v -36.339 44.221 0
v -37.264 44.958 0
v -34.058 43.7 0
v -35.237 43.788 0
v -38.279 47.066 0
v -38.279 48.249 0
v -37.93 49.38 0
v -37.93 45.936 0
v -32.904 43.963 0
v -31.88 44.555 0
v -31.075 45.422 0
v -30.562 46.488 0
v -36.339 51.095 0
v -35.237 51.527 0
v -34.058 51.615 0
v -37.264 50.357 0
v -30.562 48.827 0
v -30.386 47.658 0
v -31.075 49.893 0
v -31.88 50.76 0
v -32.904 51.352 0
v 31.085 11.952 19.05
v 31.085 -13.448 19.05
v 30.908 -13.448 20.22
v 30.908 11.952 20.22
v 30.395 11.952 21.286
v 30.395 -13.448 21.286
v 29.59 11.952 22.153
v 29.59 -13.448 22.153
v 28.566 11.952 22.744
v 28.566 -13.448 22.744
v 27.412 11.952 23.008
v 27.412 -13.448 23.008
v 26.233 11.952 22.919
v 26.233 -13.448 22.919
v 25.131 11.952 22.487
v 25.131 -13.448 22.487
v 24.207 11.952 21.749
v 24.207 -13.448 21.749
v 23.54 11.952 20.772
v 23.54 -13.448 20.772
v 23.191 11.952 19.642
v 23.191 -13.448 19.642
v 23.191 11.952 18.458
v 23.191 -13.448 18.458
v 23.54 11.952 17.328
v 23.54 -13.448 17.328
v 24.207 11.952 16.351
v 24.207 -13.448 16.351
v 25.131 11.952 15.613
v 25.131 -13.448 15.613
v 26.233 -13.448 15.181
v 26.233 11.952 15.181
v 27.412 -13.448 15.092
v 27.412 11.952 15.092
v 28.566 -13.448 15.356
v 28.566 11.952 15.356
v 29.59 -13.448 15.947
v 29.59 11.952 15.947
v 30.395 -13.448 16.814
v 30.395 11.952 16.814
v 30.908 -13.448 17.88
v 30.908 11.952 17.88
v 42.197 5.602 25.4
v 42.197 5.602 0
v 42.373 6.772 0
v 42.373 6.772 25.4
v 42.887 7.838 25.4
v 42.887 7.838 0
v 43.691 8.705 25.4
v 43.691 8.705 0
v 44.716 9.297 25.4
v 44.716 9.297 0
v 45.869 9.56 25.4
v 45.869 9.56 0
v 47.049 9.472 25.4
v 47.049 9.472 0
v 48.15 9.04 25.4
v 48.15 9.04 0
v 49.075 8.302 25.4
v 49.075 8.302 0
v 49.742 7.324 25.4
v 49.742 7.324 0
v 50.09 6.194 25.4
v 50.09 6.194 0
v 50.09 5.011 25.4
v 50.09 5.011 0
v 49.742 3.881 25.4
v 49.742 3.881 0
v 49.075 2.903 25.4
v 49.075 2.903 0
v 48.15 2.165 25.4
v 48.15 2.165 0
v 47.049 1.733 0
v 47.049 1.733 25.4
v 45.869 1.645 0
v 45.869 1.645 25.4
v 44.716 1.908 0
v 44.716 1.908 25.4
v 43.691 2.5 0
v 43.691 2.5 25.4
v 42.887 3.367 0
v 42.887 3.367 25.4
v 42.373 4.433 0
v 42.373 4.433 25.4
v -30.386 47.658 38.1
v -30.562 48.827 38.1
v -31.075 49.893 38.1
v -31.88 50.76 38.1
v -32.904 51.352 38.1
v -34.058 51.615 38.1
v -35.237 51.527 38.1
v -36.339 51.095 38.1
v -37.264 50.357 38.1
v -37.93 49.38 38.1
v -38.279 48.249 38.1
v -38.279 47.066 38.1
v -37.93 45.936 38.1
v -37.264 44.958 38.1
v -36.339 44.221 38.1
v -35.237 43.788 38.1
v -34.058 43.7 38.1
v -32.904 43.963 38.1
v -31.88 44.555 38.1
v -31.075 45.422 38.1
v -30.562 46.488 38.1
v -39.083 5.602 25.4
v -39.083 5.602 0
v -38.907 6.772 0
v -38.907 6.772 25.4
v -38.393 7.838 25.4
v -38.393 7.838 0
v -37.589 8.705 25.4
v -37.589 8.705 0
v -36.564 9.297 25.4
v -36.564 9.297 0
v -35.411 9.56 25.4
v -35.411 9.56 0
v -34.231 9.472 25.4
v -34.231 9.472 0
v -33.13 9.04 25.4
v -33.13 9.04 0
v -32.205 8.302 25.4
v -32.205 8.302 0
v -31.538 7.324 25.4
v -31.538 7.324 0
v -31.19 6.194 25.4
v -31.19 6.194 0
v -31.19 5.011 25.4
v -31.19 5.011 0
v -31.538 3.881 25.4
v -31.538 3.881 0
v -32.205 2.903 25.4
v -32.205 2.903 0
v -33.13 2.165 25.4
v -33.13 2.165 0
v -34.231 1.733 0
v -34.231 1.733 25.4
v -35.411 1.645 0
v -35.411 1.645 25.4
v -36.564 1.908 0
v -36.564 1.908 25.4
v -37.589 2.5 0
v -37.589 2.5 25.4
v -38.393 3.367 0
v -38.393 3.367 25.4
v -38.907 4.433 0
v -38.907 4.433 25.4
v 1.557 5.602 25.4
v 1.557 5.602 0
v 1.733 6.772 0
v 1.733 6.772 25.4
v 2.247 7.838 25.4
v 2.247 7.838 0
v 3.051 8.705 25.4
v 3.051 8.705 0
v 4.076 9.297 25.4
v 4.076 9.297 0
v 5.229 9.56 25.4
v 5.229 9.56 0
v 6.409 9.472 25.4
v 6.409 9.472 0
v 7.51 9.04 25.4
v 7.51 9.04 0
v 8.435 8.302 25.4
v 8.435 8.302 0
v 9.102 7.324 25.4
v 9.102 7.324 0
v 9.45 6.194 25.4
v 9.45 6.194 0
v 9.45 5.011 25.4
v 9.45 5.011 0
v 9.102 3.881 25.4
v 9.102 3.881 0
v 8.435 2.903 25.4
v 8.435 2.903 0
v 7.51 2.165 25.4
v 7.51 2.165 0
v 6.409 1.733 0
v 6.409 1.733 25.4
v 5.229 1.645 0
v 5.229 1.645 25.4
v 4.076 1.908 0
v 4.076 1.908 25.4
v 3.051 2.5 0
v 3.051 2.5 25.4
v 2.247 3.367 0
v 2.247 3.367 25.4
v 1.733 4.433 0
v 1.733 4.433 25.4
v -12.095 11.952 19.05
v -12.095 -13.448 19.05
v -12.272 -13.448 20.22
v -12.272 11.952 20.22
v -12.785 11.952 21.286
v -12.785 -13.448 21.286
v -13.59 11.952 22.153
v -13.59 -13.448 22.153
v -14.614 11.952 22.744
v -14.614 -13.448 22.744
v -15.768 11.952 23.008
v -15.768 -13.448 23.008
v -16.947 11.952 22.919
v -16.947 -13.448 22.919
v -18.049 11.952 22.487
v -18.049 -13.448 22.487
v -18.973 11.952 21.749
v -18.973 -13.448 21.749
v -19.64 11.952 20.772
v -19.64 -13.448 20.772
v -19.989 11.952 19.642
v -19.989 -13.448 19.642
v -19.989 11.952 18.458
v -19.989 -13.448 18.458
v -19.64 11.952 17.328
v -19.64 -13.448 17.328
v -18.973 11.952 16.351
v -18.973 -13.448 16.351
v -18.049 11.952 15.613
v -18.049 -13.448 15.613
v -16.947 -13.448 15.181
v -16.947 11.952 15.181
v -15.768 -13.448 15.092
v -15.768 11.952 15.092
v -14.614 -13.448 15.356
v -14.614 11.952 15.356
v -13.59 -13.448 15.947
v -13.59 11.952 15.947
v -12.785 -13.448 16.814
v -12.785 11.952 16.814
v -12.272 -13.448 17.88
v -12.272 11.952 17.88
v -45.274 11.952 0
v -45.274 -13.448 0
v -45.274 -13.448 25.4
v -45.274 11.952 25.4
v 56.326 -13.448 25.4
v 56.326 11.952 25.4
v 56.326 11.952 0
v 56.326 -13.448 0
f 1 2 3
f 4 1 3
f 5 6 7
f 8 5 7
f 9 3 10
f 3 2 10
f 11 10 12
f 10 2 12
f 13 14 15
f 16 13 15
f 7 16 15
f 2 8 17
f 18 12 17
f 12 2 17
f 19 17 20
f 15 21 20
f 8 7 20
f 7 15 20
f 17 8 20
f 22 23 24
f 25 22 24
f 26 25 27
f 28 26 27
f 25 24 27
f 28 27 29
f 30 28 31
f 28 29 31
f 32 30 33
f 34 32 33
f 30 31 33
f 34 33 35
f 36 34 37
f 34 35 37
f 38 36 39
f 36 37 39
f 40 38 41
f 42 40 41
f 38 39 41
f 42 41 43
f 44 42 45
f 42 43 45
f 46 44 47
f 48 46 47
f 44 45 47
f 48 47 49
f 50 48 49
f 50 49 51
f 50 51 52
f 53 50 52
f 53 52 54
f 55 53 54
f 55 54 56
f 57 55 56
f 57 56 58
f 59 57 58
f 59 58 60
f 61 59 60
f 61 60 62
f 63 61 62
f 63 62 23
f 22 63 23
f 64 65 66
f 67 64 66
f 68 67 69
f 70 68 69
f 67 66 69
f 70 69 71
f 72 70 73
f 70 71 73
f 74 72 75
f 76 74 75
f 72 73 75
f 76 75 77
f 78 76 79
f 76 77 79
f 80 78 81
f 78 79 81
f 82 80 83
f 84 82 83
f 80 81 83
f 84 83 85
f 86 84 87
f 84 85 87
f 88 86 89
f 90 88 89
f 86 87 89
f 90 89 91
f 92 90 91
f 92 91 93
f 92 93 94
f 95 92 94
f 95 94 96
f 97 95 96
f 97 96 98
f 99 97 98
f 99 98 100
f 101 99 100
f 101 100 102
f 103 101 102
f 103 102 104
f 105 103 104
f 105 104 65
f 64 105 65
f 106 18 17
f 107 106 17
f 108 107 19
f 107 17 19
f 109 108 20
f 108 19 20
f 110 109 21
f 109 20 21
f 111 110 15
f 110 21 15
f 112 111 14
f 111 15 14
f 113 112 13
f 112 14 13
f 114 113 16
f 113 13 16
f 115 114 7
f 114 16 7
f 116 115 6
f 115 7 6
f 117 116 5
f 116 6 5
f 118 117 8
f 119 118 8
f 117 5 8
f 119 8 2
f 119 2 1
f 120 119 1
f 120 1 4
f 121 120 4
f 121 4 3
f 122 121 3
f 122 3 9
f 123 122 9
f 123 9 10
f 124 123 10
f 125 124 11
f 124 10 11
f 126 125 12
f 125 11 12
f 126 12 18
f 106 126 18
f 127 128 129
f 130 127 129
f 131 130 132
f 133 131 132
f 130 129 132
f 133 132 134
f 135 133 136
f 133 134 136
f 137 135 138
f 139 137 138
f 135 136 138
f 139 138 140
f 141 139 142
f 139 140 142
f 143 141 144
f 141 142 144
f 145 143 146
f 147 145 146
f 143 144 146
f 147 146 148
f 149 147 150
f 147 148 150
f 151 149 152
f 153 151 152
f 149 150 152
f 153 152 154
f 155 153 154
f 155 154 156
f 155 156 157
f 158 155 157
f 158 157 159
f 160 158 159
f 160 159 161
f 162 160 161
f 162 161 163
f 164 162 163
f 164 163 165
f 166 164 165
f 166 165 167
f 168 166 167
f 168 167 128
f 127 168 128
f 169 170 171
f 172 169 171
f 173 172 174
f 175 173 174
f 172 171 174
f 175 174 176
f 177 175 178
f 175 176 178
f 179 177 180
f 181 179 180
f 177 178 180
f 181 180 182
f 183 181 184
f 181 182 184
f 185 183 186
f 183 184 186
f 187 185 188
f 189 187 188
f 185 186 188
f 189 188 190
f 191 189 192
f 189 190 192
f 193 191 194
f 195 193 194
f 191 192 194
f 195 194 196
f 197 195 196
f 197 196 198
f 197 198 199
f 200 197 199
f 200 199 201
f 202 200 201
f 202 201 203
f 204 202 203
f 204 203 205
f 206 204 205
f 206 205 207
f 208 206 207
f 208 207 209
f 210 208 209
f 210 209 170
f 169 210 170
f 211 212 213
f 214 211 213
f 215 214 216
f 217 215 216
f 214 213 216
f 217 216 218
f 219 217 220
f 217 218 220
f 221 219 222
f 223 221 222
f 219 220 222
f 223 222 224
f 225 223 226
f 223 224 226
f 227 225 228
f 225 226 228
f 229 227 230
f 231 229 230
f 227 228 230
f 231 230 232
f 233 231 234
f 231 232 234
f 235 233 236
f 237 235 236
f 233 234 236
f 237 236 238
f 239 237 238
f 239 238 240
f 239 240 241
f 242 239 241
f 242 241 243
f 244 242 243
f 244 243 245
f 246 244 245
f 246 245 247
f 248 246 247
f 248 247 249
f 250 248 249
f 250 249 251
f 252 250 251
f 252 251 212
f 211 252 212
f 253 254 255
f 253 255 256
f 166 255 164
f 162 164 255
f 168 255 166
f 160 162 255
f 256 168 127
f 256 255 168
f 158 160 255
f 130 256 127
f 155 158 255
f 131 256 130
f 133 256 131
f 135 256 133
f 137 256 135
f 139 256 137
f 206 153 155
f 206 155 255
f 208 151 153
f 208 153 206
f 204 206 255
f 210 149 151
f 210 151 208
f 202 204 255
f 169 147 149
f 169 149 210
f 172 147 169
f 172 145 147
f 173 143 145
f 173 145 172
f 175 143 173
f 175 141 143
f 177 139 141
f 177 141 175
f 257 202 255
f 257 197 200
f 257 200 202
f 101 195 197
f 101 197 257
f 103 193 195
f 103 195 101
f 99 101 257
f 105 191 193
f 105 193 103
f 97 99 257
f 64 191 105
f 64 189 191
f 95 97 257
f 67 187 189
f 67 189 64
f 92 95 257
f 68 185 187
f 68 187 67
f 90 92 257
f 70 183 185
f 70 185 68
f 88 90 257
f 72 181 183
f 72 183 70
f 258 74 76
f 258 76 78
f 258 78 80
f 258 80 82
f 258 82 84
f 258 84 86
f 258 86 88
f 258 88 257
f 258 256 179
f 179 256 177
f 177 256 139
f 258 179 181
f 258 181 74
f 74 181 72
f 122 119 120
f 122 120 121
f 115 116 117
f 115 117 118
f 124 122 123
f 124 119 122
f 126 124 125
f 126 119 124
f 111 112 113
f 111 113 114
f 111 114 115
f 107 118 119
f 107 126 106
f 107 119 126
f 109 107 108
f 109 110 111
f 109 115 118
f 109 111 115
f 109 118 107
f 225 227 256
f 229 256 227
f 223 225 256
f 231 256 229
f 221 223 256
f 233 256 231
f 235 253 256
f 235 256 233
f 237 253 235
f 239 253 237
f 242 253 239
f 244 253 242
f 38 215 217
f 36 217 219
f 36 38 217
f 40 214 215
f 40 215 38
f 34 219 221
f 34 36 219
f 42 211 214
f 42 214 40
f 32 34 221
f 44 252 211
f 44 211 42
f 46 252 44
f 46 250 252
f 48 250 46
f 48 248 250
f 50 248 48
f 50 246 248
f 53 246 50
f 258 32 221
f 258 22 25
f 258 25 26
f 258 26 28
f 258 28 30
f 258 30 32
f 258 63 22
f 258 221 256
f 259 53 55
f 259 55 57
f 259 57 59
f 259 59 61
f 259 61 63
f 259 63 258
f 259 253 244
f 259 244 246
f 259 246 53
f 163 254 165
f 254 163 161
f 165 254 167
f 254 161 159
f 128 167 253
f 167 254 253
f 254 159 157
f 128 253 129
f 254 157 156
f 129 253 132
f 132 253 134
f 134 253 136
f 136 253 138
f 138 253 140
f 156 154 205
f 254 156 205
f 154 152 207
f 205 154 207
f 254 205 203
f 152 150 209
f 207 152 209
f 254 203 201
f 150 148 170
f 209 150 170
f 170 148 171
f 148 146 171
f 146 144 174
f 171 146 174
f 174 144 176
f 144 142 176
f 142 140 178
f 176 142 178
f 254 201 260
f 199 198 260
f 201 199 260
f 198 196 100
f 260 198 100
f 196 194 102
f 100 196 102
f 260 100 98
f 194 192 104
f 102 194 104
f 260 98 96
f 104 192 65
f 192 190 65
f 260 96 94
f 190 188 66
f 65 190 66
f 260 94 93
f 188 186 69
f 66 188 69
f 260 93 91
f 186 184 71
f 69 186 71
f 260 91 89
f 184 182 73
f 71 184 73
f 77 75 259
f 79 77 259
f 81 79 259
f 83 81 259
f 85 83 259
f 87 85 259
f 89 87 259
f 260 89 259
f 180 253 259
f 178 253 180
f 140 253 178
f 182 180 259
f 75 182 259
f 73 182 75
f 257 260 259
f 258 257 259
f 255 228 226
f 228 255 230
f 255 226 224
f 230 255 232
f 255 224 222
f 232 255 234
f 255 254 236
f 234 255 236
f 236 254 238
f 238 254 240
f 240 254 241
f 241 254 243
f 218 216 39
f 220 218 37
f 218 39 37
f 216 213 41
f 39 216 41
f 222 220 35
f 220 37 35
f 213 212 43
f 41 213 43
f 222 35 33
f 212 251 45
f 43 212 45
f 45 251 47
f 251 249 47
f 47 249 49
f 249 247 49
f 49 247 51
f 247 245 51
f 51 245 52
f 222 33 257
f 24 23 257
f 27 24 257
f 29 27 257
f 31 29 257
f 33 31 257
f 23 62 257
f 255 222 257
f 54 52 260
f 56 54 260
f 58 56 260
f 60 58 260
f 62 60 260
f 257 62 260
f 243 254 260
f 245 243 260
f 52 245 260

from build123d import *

# Parameters (mm, degrees)
F0_W     = 101.6
F0_H     = 25.4
F1_DEPTH = 25.4
F3_D     = 7.9375
F4_R     = 3.96875
F5_DEPTH = 38.1
F7_D     = 7.9375


with BuildPart() as f1:
    # F0 (on Top) → F1 (new body)
    with BuildSketch(Plane.XY):
        with Locations((5.525812, -0.747523)):
            Rectangle(F0_W, F0_H)
    extrude(amount=F1_DEPTH)

    # F3 (through all)
    with Locations(Plane.XY.offset(25.4)):
        with Locations((-35.114188, 5.602477), (5.525812, 5.602477), (46.165812, 5.602477)):
            Hole(F3_D / 2)

    # F7 (through all)
    with Locations(Plane(origin=(0, 11.952477, 0), x_dir=(-1, 0, 0), z_dir=(0, 1, 0))):
        with Locations((16.064188, 19.05), (-27.115812, 19.05)):
            Hole(F7_D / 2)


with BuildPart() as f5:
    # F4 (on Top) → F5 (new body)
    with BuildSketch(Plane.XY):
        with Locations((-34.354363, 47.657553)):
            Circle(F4_R)
    extrude(amount=F5_DEPTH)


solid = Compound([f1.part, f5.part])
